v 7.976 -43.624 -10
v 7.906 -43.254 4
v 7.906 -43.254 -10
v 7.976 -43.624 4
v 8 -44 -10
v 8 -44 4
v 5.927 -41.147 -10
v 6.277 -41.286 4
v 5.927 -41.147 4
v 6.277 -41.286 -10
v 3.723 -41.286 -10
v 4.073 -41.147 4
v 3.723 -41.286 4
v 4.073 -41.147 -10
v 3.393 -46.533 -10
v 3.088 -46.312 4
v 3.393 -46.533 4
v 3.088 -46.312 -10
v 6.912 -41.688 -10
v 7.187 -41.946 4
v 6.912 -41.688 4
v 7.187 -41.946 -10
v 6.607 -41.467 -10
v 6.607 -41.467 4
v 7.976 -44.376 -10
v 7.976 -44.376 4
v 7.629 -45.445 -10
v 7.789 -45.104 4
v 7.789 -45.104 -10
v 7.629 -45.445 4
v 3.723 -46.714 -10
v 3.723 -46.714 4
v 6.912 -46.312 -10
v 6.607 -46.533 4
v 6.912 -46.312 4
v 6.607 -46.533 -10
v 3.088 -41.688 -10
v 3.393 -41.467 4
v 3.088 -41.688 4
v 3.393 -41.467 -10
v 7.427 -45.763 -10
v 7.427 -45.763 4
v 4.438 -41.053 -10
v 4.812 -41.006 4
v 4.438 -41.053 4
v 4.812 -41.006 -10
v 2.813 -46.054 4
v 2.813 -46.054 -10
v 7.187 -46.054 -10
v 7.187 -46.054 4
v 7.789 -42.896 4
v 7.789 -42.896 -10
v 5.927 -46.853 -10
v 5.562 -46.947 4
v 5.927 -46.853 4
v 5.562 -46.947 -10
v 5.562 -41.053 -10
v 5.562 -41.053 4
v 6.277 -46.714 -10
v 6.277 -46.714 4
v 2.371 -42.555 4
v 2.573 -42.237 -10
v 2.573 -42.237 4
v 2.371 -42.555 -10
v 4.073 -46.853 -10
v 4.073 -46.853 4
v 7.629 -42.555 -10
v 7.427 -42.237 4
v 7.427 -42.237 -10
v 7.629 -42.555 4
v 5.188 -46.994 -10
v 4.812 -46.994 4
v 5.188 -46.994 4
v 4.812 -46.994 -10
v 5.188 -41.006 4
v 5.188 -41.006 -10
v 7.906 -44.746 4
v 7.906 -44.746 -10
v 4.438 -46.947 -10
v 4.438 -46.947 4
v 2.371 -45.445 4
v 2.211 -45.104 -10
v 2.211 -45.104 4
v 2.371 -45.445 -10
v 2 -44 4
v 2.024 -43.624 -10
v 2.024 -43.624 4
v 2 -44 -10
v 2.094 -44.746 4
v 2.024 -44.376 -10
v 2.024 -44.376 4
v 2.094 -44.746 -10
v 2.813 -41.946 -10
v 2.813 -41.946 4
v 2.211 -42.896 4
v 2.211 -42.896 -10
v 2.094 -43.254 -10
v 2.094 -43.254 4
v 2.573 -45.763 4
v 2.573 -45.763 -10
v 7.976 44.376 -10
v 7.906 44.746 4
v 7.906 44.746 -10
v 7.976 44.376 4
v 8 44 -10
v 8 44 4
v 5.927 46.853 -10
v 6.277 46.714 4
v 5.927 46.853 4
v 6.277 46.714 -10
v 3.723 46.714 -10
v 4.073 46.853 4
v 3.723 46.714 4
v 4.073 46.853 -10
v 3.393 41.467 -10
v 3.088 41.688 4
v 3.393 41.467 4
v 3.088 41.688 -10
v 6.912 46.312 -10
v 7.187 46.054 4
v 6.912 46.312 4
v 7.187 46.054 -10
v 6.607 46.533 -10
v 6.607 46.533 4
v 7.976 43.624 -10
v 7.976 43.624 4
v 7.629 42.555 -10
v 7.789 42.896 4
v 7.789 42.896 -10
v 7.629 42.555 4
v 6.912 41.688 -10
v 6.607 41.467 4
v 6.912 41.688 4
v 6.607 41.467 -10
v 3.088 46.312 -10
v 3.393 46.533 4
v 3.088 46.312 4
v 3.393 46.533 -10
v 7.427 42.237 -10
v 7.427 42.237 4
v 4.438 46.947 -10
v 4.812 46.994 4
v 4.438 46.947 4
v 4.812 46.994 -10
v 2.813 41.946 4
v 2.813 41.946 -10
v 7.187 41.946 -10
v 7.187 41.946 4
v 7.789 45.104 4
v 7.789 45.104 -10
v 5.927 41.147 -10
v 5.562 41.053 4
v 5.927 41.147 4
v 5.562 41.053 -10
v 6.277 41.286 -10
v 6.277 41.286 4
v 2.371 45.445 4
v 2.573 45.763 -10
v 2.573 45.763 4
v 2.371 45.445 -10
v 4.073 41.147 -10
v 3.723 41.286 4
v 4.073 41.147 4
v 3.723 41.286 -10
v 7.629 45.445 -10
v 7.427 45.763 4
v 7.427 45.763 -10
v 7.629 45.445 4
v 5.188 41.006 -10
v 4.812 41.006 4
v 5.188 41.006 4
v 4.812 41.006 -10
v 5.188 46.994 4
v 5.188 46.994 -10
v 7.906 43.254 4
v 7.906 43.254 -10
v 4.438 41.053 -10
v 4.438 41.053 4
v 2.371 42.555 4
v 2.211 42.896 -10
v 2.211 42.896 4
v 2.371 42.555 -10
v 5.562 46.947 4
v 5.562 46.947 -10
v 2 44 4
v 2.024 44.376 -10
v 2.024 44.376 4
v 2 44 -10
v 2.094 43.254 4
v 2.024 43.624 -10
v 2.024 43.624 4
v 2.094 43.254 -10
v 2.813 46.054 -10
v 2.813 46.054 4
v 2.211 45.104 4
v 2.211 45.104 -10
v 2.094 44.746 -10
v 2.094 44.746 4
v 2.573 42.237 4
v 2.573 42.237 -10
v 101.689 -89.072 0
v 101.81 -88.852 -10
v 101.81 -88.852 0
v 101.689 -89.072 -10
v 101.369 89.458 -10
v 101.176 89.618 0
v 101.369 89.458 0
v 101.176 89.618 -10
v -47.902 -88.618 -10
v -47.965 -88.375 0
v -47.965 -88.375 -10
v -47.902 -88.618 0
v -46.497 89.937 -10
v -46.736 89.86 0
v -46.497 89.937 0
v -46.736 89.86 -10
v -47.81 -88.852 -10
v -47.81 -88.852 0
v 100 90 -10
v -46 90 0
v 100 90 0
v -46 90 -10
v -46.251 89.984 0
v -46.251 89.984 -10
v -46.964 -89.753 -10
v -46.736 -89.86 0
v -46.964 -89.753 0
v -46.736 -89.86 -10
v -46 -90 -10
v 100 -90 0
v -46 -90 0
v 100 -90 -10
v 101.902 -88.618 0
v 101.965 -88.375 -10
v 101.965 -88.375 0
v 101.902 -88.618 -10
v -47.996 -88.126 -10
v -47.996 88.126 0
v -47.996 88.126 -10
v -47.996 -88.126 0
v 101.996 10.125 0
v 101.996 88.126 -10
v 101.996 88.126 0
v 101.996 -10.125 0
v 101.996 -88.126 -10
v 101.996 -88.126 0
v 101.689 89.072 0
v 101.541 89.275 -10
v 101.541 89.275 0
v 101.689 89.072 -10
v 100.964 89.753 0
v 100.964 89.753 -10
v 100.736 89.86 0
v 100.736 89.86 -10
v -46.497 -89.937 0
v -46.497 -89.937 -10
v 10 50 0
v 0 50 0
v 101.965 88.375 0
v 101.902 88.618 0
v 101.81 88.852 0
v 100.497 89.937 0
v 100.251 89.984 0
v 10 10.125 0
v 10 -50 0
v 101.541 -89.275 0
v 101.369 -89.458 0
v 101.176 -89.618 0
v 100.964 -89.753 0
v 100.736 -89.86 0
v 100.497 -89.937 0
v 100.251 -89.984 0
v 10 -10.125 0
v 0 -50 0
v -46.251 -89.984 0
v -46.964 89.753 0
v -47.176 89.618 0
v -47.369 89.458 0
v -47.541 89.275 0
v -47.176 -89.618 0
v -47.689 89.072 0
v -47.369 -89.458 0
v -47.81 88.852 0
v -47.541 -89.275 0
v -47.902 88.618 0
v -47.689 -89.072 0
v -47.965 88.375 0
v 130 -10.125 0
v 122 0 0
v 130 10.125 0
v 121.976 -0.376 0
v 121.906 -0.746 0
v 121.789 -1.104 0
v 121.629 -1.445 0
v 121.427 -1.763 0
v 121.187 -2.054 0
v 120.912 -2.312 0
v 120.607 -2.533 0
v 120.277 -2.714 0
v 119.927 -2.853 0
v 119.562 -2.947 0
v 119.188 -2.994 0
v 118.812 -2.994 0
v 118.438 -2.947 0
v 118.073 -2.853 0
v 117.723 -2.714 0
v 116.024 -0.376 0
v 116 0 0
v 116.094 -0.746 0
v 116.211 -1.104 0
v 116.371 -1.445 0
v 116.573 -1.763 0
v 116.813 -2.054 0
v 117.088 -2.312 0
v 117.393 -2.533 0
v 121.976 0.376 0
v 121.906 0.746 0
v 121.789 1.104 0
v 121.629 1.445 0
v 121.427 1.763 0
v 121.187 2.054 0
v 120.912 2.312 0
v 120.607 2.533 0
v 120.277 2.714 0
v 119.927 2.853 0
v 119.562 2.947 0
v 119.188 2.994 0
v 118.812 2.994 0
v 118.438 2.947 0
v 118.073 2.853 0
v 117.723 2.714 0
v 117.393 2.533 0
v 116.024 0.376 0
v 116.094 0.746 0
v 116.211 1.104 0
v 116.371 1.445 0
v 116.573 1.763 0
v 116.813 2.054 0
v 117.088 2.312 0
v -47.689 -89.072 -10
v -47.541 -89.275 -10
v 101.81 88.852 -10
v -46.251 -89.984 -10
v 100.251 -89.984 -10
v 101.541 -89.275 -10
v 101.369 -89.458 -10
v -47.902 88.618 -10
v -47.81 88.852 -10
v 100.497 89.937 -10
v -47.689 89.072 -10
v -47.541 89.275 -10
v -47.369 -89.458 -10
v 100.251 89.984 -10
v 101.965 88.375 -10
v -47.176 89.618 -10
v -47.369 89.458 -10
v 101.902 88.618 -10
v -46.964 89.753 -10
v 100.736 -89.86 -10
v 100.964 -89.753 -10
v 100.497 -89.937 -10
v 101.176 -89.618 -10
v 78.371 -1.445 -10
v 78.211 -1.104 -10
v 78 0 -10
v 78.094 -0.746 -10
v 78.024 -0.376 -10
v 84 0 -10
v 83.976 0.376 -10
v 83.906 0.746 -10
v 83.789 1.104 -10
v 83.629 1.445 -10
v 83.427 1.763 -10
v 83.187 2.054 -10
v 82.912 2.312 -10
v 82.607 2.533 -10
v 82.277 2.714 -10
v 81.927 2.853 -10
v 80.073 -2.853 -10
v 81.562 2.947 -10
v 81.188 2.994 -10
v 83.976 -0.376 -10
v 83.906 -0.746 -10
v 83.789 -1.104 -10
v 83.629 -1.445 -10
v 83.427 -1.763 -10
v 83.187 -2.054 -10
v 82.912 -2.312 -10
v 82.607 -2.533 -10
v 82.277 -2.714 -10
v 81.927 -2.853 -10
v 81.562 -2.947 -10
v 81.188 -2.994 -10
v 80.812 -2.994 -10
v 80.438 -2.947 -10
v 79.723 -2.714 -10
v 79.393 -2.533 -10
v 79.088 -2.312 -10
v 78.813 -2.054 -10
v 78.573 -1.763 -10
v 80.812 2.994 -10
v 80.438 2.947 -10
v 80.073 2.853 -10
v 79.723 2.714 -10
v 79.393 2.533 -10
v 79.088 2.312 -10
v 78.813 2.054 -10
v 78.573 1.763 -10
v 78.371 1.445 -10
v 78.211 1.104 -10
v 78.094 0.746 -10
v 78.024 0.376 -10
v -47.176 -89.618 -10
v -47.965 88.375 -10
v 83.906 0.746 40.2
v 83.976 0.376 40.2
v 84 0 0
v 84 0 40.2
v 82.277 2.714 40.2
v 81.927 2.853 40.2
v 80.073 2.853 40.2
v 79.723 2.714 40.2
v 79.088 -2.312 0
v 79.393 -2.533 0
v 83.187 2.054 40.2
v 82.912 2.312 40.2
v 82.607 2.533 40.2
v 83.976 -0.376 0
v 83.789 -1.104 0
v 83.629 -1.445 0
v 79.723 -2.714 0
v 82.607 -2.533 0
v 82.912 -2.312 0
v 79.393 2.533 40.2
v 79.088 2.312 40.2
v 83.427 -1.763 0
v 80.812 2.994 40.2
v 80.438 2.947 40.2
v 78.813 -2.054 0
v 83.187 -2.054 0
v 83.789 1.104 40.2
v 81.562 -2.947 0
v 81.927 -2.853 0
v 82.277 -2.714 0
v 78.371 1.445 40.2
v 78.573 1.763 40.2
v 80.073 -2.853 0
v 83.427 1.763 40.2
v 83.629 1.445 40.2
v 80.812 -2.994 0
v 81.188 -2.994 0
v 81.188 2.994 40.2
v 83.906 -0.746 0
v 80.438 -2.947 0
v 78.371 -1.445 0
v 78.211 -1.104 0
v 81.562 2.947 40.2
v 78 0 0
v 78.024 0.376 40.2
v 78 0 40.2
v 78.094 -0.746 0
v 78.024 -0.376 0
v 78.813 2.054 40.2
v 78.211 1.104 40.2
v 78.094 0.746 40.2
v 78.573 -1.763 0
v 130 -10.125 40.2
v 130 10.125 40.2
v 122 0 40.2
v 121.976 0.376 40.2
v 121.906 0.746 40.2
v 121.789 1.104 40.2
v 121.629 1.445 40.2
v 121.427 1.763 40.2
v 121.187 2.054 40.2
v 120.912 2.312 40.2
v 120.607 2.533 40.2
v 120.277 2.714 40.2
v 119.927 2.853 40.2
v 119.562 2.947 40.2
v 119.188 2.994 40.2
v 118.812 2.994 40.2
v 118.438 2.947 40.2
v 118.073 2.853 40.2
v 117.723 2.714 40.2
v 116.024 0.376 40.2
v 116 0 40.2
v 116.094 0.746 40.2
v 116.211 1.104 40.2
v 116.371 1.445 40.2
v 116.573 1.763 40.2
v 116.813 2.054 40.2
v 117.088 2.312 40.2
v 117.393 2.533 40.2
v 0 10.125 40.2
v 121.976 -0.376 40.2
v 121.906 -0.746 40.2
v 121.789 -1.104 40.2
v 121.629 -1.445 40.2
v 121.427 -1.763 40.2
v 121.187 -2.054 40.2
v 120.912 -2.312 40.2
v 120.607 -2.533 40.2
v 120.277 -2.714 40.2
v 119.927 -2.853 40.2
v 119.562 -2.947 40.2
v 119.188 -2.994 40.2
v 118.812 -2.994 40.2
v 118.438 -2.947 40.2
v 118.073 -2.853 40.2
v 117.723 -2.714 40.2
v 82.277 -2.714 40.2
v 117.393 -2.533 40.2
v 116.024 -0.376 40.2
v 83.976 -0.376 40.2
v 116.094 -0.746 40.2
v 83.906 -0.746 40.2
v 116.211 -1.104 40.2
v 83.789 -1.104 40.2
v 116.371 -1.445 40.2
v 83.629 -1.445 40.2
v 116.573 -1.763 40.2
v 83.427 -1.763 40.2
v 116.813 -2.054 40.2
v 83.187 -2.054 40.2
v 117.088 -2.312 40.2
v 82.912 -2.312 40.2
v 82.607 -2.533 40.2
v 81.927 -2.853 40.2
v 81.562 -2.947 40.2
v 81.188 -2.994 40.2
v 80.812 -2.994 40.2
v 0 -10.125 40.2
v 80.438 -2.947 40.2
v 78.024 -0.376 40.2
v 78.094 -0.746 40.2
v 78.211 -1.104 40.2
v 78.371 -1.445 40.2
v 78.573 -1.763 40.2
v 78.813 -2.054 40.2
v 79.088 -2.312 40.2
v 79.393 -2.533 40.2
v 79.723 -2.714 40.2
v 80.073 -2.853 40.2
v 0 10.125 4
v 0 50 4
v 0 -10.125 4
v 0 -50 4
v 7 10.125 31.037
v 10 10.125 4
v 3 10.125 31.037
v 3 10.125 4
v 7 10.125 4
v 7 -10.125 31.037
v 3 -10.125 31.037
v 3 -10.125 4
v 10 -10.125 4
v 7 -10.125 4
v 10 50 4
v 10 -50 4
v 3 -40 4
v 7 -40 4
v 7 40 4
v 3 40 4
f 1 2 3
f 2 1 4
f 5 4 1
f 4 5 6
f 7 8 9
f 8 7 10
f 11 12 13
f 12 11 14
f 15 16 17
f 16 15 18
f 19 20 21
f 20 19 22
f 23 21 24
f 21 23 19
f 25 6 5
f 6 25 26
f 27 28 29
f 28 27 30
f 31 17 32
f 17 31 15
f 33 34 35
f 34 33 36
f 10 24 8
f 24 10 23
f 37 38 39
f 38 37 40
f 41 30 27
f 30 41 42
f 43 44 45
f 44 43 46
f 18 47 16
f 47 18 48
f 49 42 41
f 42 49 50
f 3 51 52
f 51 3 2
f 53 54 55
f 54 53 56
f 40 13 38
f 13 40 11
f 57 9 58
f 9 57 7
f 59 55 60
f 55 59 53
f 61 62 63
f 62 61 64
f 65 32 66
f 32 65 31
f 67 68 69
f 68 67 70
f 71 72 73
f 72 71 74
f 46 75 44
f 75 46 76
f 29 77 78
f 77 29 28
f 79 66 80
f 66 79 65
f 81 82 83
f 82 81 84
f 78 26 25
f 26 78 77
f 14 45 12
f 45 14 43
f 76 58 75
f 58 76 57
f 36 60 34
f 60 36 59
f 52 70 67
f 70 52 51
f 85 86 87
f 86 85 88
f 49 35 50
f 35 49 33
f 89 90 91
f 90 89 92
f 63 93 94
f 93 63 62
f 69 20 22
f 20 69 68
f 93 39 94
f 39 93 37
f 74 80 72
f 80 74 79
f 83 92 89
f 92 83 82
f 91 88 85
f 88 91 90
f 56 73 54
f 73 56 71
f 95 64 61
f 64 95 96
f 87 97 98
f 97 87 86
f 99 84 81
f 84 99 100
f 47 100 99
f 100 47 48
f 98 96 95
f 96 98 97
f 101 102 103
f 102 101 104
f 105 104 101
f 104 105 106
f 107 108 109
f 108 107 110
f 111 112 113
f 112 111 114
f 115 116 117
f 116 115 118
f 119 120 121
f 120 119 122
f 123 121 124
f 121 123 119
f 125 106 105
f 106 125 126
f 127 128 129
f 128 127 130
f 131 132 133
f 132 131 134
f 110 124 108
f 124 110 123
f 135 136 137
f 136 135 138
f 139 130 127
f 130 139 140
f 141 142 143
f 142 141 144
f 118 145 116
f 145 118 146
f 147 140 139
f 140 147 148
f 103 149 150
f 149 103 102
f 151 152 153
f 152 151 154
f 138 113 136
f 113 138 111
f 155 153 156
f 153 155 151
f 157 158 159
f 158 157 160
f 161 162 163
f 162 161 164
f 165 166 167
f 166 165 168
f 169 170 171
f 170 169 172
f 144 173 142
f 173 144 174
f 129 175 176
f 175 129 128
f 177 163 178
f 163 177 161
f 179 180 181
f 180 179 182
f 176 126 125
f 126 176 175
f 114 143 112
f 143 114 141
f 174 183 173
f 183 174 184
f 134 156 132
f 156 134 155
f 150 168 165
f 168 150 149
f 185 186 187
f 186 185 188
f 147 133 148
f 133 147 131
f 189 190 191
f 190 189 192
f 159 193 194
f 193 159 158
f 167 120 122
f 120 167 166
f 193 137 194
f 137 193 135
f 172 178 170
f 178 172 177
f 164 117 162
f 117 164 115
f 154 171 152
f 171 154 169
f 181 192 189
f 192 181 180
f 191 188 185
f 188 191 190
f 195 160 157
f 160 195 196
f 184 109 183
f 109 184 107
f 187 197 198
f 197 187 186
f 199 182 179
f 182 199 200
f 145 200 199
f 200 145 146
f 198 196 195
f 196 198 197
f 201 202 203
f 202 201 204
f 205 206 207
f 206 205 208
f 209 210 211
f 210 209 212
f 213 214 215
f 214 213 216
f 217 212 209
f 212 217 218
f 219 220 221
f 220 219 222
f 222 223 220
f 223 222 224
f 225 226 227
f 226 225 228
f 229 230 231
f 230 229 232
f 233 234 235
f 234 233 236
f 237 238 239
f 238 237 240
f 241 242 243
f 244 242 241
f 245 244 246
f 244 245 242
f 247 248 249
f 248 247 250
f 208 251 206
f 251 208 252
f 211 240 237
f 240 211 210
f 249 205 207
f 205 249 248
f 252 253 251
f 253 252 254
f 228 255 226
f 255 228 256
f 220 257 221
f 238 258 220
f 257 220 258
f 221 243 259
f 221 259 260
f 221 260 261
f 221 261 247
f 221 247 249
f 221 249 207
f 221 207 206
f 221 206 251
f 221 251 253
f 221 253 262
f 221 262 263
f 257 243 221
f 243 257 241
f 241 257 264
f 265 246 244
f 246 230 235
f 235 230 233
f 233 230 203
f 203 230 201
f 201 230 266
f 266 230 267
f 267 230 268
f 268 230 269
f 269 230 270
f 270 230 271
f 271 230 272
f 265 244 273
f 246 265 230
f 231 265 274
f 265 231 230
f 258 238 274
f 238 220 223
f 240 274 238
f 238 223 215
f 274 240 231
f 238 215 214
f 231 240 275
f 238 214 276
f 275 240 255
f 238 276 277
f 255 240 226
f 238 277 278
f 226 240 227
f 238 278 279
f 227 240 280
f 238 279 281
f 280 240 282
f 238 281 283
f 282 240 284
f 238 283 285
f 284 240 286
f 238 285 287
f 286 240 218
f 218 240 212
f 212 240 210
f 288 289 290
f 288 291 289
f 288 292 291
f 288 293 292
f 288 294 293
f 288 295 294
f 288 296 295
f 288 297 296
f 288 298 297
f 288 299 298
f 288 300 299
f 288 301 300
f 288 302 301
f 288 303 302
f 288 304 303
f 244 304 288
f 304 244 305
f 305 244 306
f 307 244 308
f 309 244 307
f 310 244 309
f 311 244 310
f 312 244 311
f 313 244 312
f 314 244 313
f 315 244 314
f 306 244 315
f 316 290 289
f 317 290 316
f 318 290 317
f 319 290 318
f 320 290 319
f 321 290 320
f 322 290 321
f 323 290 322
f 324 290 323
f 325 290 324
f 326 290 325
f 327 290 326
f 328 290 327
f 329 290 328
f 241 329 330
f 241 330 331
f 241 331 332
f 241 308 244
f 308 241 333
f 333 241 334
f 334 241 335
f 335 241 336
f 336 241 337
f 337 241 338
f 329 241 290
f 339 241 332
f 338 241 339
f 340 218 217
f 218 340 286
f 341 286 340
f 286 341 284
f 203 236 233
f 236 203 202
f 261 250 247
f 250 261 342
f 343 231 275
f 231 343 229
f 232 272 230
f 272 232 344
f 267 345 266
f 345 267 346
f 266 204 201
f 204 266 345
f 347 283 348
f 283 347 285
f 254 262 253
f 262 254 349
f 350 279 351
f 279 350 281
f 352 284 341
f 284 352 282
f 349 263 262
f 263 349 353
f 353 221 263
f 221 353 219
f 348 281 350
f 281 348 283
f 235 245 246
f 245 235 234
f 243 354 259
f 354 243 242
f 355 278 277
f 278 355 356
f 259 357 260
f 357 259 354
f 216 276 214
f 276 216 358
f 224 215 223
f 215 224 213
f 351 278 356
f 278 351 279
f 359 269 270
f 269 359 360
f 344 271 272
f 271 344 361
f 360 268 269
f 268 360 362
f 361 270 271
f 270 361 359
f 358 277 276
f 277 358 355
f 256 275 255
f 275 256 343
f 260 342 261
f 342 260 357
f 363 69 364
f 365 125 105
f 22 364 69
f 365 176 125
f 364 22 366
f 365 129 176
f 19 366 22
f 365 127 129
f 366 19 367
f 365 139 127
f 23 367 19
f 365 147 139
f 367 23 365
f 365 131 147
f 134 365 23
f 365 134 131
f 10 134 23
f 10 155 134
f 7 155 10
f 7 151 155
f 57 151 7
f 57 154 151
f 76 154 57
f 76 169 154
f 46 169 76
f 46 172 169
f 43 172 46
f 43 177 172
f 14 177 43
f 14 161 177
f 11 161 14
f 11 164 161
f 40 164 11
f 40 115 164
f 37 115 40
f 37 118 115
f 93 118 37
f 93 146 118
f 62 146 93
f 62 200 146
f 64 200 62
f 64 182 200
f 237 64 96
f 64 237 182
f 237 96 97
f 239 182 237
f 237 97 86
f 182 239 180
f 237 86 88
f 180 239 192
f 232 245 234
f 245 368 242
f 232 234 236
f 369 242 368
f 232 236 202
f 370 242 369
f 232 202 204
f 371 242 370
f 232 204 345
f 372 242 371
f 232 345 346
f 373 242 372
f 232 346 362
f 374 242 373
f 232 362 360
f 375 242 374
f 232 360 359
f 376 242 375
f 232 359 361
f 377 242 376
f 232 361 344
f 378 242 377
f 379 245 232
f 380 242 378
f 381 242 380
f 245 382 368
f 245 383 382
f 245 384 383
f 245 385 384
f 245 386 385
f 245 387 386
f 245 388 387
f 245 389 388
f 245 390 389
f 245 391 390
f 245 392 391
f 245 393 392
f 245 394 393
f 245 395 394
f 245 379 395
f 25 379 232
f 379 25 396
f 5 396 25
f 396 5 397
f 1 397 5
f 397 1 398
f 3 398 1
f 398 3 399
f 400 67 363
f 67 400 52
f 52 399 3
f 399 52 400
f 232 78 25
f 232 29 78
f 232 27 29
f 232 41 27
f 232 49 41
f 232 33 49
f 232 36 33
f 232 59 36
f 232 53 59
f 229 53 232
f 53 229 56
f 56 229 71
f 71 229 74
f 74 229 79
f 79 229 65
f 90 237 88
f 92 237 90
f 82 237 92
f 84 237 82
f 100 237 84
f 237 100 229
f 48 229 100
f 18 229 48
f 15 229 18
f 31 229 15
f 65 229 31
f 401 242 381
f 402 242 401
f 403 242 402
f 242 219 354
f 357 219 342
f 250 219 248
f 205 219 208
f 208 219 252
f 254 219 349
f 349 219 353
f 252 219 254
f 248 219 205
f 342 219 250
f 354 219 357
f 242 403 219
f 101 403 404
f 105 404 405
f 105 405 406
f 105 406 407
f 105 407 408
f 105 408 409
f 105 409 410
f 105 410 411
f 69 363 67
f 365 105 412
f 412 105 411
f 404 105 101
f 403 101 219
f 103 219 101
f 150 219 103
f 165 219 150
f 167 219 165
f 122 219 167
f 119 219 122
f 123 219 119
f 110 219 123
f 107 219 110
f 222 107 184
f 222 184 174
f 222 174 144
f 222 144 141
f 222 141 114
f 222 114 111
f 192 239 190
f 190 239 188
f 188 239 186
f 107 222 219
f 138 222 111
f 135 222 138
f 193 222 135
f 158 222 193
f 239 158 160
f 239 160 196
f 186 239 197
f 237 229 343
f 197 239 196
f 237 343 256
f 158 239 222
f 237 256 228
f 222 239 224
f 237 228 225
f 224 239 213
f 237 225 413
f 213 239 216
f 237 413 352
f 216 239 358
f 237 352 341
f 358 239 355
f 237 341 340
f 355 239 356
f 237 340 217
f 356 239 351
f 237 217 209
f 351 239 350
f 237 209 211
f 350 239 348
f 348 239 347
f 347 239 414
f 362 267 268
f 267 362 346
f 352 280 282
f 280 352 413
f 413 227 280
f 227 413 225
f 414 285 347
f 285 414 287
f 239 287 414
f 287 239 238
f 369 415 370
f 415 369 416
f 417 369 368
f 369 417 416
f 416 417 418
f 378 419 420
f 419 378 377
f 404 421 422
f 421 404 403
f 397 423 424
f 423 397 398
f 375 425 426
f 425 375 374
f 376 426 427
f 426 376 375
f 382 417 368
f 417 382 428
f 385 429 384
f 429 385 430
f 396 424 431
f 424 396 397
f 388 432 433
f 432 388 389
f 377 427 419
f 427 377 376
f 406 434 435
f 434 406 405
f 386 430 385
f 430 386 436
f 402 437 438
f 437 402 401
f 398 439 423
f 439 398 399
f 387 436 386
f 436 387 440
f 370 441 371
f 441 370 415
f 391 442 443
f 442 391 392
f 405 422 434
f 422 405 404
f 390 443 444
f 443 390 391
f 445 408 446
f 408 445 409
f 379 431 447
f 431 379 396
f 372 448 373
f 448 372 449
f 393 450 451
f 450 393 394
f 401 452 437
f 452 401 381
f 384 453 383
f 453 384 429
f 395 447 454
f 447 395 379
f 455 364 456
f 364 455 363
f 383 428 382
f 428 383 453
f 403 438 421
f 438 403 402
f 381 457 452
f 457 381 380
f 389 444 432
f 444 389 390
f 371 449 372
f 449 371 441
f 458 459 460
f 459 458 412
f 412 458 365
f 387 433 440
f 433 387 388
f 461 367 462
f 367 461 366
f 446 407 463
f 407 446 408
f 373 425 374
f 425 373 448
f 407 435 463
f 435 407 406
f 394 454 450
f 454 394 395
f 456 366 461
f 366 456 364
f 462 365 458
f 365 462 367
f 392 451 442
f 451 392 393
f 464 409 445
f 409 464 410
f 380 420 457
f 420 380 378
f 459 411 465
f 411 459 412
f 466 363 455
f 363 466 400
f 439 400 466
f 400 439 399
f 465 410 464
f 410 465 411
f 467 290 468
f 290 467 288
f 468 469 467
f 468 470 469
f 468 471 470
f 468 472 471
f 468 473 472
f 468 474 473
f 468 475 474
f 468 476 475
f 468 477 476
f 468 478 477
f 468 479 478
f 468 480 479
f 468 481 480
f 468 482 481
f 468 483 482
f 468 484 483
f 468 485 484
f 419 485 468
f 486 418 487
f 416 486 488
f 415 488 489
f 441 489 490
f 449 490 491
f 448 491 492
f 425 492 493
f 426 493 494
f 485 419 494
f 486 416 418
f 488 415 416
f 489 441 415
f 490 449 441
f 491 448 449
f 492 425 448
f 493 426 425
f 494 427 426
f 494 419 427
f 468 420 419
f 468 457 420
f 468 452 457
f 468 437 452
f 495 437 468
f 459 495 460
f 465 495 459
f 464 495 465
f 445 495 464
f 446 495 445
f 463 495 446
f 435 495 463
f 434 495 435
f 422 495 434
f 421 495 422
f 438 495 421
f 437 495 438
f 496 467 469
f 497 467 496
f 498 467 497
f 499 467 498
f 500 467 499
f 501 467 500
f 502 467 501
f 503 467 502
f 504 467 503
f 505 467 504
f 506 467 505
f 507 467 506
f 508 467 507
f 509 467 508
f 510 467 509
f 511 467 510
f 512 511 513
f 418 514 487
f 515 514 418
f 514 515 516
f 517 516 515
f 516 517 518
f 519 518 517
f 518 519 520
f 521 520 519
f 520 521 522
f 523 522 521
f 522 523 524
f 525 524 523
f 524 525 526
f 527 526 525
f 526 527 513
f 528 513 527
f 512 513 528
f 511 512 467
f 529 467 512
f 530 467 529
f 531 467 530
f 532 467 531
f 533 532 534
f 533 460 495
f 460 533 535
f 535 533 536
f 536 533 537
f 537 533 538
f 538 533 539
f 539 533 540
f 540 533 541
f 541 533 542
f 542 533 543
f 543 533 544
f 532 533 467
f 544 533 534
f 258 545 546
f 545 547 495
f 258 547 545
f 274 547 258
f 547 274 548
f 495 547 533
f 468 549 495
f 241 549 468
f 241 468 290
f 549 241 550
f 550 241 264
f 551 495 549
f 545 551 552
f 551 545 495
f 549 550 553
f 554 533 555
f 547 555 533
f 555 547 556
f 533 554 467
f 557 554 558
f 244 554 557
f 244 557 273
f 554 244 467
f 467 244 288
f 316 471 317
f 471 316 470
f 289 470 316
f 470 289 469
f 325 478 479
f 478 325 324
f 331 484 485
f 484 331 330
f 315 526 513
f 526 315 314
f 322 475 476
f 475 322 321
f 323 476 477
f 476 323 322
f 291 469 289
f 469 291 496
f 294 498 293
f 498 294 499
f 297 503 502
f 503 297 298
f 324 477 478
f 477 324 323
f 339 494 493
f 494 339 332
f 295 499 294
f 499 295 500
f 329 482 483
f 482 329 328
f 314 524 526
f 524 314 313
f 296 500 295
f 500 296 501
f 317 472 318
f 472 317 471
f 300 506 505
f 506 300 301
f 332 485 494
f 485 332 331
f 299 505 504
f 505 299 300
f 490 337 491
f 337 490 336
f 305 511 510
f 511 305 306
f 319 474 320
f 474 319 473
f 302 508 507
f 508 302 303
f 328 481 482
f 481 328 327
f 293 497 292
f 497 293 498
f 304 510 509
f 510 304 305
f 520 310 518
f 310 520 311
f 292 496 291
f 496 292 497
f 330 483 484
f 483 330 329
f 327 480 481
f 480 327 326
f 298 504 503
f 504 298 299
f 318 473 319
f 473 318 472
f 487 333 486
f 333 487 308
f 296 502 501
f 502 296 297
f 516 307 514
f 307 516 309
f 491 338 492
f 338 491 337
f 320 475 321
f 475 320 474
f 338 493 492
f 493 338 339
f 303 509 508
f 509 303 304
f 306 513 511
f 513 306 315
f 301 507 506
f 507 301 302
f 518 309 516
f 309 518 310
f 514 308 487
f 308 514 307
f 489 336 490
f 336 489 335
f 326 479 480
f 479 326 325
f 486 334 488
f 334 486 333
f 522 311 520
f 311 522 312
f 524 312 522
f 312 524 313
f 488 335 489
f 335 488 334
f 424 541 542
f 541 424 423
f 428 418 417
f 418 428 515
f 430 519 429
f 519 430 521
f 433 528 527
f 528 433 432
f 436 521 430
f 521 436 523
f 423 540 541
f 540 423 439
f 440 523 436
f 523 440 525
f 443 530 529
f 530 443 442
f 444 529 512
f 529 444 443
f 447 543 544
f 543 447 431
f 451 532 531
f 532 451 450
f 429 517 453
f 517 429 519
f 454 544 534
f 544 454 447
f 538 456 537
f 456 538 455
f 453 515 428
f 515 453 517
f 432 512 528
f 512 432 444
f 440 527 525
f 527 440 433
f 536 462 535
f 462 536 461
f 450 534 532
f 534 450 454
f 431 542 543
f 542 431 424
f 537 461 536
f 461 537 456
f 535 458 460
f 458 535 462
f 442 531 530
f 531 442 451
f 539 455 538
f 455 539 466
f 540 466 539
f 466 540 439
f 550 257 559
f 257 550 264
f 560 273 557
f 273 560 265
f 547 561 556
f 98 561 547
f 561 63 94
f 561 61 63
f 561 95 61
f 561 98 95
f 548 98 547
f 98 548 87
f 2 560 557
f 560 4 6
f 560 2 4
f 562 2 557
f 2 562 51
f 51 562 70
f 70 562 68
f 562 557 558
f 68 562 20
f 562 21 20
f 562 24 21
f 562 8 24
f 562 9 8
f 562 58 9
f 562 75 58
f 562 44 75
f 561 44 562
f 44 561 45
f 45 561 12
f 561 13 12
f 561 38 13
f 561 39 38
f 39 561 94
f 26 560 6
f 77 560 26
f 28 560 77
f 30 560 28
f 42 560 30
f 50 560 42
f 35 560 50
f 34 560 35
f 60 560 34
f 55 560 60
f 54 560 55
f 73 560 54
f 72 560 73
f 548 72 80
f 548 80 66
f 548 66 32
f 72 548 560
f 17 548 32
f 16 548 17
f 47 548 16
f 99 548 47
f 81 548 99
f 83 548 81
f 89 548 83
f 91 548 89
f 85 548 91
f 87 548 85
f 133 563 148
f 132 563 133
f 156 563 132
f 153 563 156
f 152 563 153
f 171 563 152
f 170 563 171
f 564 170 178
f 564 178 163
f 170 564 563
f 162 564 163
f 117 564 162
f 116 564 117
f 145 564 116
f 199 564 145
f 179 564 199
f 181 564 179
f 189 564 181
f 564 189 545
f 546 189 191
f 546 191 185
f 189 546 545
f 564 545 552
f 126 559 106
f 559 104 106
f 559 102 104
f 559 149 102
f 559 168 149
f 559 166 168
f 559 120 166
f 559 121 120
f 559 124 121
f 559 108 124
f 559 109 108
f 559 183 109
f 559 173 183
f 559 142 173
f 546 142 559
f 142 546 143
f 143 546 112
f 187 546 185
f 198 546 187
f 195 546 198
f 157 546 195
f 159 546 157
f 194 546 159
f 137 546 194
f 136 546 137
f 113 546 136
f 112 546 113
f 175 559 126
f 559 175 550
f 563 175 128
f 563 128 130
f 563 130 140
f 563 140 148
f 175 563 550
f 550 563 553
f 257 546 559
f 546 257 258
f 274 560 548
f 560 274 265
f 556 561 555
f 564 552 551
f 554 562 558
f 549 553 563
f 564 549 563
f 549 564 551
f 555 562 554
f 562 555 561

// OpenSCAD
// speaker seat parameters
w_speaker_seat = 180;
l_speaker_seat = 150;
h_speaker_seat = 10;
r_plate_corner = 2;

// support arm parameters
l_arm = 130;
h_arm = 40.2;
w_arm = 20.25;
d_arm_under_seat = 100;
d_holes = 6;
support_thickness = 4;
$fn=50;

// TODO: break into 2; speaker seat and arm parts for easier printing

module speaker_seat() {
    w_offset = w_speaker_seat-2*r_plate_corner;
    l_offset = l_speaker_seat-2*r_plate_corner;
    difference() {        
        translate([d_arm_under_seat,-w_offset/2,-h_speaker_seat/2]) {
            rotate([0,0,90])
            // minkowski sum to get rounded corners
            minkowski() {        
                // square plate; h/2 because minkowski sums in all dimensions
                cube([w_offset, l_offset, h_speaker_seat/2], center=true);
                // rounded corners; h/2 because minkowski sums in all dimensions
                translate([w_offset/2, l_offset/2, 0])
                cylinder(h=h_speaker_seat/2, r=r_plate_corner,center=true);
            }
        }
        // holes perpindicular to direction of arm
        for (i=[-1:2:1]) {
            translate([h_speaker_seat/2,i*(d_arm_under_seat/2-d_holes),-h_speaker_seat/2])
            cylinder(r=d_holes/2, h=2*h_speaker_seat, center=true);
        }
        // holes in direction of arm
        translate([d_arm_under_seat-19,0,-h_speaker_seat/2])
        cylinder(r=d_holes/2, h=2*h_speaker_seat, center=true);
    }
}

module speaker_arm_bottom() {
    translate([0,-w_arm/2,0])
    difference() {
        cube([l_arm, w_arm, h_arm]);
        // hole for attaching to bracket
        translate([d_arm_under_seat+19,w_arm/2,-h_arm/2]) 
        cylinder(r=d_holes/2, h=2*h_arm);
        // hole for attaching in direction of arm
        translate([d_arm_under_seat-19,w_arm/2,-h_arm/2])
        cylinder(r=d_holes/2, h=2*h_arm);
    }
}

module speaker_support() {
    difference() {
        translate([0,-50,0])
        cube([h_speaker_seat,d_arm_under_seat,4]);
        // holes perpindicular to direction of arm
        for (i=[-1:2:1]) {
            translate([h_speaker_seat/2,i*(d_arm_under_seat/2-d_holes),4/2])
            cylinder(r=d_holes/2, h=2*support_thickness, center=true);
        }
    }
    //
    translate([(h_speaker_seat-support_thickness)/2,0,support_thickness])
    rotate([0,90,0])
    rotate([0,0,90])
    linear_extrude(height=support_thickness)
    polygon([[-d_arm_under_seat/2+10,0],[d_arm_under_seat/2-10,0],[0,h_arm-4]]);
}

union() {
speaker_seat();
speaker_arm_bottom();
speaker_support();
}
